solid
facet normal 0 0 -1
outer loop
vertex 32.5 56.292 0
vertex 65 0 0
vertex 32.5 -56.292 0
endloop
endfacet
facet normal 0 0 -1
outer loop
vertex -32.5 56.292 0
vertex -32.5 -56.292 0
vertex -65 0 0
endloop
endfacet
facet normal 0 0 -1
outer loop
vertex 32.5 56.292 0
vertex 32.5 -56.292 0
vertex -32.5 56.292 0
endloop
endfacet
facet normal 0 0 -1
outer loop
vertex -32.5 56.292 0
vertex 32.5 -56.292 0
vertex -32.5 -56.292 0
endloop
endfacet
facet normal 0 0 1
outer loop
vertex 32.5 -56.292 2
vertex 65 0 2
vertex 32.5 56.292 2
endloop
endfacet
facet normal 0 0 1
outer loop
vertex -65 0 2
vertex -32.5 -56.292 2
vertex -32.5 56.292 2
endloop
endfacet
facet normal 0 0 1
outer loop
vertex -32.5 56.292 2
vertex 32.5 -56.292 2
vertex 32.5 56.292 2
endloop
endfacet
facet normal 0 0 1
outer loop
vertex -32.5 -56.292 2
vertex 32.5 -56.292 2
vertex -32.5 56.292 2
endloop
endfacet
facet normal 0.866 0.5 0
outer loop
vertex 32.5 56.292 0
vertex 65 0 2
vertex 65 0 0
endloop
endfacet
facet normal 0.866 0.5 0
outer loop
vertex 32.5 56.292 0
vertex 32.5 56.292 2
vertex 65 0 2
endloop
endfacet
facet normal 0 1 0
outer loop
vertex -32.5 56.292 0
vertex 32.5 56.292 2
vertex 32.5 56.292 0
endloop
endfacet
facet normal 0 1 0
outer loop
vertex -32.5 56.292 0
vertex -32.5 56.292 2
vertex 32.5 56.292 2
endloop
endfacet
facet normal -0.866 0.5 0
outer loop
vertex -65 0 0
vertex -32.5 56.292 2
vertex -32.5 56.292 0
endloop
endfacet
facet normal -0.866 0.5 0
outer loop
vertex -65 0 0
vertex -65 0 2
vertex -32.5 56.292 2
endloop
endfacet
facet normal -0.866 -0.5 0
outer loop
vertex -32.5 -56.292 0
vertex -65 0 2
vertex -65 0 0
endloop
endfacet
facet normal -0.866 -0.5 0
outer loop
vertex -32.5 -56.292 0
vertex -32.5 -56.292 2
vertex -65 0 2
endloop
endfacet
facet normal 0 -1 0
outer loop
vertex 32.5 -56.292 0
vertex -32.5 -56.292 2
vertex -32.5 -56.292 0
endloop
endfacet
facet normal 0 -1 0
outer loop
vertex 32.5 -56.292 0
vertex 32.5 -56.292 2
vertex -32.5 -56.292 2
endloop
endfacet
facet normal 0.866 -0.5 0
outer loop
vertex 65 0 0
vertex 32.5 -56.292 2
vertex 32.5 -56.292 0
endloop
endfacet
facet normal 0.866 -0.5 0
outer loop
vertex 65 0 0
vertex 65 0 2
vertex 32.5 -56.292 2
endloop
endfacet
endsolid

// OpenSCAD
// file: config.scad
HEX_WIDTH= 130;
HEX_BORDER = 6;
HEX_HEIGHT = 20;
HEX_ARM = HEX_WIDTH / 6;
SHIELD_THICKNESS = 2;
// main file
include <config.scad>;
$fn = 6;
linear_extrude(SHIELD_THICKNESS)
circle(d=HEX_WIDTH);
